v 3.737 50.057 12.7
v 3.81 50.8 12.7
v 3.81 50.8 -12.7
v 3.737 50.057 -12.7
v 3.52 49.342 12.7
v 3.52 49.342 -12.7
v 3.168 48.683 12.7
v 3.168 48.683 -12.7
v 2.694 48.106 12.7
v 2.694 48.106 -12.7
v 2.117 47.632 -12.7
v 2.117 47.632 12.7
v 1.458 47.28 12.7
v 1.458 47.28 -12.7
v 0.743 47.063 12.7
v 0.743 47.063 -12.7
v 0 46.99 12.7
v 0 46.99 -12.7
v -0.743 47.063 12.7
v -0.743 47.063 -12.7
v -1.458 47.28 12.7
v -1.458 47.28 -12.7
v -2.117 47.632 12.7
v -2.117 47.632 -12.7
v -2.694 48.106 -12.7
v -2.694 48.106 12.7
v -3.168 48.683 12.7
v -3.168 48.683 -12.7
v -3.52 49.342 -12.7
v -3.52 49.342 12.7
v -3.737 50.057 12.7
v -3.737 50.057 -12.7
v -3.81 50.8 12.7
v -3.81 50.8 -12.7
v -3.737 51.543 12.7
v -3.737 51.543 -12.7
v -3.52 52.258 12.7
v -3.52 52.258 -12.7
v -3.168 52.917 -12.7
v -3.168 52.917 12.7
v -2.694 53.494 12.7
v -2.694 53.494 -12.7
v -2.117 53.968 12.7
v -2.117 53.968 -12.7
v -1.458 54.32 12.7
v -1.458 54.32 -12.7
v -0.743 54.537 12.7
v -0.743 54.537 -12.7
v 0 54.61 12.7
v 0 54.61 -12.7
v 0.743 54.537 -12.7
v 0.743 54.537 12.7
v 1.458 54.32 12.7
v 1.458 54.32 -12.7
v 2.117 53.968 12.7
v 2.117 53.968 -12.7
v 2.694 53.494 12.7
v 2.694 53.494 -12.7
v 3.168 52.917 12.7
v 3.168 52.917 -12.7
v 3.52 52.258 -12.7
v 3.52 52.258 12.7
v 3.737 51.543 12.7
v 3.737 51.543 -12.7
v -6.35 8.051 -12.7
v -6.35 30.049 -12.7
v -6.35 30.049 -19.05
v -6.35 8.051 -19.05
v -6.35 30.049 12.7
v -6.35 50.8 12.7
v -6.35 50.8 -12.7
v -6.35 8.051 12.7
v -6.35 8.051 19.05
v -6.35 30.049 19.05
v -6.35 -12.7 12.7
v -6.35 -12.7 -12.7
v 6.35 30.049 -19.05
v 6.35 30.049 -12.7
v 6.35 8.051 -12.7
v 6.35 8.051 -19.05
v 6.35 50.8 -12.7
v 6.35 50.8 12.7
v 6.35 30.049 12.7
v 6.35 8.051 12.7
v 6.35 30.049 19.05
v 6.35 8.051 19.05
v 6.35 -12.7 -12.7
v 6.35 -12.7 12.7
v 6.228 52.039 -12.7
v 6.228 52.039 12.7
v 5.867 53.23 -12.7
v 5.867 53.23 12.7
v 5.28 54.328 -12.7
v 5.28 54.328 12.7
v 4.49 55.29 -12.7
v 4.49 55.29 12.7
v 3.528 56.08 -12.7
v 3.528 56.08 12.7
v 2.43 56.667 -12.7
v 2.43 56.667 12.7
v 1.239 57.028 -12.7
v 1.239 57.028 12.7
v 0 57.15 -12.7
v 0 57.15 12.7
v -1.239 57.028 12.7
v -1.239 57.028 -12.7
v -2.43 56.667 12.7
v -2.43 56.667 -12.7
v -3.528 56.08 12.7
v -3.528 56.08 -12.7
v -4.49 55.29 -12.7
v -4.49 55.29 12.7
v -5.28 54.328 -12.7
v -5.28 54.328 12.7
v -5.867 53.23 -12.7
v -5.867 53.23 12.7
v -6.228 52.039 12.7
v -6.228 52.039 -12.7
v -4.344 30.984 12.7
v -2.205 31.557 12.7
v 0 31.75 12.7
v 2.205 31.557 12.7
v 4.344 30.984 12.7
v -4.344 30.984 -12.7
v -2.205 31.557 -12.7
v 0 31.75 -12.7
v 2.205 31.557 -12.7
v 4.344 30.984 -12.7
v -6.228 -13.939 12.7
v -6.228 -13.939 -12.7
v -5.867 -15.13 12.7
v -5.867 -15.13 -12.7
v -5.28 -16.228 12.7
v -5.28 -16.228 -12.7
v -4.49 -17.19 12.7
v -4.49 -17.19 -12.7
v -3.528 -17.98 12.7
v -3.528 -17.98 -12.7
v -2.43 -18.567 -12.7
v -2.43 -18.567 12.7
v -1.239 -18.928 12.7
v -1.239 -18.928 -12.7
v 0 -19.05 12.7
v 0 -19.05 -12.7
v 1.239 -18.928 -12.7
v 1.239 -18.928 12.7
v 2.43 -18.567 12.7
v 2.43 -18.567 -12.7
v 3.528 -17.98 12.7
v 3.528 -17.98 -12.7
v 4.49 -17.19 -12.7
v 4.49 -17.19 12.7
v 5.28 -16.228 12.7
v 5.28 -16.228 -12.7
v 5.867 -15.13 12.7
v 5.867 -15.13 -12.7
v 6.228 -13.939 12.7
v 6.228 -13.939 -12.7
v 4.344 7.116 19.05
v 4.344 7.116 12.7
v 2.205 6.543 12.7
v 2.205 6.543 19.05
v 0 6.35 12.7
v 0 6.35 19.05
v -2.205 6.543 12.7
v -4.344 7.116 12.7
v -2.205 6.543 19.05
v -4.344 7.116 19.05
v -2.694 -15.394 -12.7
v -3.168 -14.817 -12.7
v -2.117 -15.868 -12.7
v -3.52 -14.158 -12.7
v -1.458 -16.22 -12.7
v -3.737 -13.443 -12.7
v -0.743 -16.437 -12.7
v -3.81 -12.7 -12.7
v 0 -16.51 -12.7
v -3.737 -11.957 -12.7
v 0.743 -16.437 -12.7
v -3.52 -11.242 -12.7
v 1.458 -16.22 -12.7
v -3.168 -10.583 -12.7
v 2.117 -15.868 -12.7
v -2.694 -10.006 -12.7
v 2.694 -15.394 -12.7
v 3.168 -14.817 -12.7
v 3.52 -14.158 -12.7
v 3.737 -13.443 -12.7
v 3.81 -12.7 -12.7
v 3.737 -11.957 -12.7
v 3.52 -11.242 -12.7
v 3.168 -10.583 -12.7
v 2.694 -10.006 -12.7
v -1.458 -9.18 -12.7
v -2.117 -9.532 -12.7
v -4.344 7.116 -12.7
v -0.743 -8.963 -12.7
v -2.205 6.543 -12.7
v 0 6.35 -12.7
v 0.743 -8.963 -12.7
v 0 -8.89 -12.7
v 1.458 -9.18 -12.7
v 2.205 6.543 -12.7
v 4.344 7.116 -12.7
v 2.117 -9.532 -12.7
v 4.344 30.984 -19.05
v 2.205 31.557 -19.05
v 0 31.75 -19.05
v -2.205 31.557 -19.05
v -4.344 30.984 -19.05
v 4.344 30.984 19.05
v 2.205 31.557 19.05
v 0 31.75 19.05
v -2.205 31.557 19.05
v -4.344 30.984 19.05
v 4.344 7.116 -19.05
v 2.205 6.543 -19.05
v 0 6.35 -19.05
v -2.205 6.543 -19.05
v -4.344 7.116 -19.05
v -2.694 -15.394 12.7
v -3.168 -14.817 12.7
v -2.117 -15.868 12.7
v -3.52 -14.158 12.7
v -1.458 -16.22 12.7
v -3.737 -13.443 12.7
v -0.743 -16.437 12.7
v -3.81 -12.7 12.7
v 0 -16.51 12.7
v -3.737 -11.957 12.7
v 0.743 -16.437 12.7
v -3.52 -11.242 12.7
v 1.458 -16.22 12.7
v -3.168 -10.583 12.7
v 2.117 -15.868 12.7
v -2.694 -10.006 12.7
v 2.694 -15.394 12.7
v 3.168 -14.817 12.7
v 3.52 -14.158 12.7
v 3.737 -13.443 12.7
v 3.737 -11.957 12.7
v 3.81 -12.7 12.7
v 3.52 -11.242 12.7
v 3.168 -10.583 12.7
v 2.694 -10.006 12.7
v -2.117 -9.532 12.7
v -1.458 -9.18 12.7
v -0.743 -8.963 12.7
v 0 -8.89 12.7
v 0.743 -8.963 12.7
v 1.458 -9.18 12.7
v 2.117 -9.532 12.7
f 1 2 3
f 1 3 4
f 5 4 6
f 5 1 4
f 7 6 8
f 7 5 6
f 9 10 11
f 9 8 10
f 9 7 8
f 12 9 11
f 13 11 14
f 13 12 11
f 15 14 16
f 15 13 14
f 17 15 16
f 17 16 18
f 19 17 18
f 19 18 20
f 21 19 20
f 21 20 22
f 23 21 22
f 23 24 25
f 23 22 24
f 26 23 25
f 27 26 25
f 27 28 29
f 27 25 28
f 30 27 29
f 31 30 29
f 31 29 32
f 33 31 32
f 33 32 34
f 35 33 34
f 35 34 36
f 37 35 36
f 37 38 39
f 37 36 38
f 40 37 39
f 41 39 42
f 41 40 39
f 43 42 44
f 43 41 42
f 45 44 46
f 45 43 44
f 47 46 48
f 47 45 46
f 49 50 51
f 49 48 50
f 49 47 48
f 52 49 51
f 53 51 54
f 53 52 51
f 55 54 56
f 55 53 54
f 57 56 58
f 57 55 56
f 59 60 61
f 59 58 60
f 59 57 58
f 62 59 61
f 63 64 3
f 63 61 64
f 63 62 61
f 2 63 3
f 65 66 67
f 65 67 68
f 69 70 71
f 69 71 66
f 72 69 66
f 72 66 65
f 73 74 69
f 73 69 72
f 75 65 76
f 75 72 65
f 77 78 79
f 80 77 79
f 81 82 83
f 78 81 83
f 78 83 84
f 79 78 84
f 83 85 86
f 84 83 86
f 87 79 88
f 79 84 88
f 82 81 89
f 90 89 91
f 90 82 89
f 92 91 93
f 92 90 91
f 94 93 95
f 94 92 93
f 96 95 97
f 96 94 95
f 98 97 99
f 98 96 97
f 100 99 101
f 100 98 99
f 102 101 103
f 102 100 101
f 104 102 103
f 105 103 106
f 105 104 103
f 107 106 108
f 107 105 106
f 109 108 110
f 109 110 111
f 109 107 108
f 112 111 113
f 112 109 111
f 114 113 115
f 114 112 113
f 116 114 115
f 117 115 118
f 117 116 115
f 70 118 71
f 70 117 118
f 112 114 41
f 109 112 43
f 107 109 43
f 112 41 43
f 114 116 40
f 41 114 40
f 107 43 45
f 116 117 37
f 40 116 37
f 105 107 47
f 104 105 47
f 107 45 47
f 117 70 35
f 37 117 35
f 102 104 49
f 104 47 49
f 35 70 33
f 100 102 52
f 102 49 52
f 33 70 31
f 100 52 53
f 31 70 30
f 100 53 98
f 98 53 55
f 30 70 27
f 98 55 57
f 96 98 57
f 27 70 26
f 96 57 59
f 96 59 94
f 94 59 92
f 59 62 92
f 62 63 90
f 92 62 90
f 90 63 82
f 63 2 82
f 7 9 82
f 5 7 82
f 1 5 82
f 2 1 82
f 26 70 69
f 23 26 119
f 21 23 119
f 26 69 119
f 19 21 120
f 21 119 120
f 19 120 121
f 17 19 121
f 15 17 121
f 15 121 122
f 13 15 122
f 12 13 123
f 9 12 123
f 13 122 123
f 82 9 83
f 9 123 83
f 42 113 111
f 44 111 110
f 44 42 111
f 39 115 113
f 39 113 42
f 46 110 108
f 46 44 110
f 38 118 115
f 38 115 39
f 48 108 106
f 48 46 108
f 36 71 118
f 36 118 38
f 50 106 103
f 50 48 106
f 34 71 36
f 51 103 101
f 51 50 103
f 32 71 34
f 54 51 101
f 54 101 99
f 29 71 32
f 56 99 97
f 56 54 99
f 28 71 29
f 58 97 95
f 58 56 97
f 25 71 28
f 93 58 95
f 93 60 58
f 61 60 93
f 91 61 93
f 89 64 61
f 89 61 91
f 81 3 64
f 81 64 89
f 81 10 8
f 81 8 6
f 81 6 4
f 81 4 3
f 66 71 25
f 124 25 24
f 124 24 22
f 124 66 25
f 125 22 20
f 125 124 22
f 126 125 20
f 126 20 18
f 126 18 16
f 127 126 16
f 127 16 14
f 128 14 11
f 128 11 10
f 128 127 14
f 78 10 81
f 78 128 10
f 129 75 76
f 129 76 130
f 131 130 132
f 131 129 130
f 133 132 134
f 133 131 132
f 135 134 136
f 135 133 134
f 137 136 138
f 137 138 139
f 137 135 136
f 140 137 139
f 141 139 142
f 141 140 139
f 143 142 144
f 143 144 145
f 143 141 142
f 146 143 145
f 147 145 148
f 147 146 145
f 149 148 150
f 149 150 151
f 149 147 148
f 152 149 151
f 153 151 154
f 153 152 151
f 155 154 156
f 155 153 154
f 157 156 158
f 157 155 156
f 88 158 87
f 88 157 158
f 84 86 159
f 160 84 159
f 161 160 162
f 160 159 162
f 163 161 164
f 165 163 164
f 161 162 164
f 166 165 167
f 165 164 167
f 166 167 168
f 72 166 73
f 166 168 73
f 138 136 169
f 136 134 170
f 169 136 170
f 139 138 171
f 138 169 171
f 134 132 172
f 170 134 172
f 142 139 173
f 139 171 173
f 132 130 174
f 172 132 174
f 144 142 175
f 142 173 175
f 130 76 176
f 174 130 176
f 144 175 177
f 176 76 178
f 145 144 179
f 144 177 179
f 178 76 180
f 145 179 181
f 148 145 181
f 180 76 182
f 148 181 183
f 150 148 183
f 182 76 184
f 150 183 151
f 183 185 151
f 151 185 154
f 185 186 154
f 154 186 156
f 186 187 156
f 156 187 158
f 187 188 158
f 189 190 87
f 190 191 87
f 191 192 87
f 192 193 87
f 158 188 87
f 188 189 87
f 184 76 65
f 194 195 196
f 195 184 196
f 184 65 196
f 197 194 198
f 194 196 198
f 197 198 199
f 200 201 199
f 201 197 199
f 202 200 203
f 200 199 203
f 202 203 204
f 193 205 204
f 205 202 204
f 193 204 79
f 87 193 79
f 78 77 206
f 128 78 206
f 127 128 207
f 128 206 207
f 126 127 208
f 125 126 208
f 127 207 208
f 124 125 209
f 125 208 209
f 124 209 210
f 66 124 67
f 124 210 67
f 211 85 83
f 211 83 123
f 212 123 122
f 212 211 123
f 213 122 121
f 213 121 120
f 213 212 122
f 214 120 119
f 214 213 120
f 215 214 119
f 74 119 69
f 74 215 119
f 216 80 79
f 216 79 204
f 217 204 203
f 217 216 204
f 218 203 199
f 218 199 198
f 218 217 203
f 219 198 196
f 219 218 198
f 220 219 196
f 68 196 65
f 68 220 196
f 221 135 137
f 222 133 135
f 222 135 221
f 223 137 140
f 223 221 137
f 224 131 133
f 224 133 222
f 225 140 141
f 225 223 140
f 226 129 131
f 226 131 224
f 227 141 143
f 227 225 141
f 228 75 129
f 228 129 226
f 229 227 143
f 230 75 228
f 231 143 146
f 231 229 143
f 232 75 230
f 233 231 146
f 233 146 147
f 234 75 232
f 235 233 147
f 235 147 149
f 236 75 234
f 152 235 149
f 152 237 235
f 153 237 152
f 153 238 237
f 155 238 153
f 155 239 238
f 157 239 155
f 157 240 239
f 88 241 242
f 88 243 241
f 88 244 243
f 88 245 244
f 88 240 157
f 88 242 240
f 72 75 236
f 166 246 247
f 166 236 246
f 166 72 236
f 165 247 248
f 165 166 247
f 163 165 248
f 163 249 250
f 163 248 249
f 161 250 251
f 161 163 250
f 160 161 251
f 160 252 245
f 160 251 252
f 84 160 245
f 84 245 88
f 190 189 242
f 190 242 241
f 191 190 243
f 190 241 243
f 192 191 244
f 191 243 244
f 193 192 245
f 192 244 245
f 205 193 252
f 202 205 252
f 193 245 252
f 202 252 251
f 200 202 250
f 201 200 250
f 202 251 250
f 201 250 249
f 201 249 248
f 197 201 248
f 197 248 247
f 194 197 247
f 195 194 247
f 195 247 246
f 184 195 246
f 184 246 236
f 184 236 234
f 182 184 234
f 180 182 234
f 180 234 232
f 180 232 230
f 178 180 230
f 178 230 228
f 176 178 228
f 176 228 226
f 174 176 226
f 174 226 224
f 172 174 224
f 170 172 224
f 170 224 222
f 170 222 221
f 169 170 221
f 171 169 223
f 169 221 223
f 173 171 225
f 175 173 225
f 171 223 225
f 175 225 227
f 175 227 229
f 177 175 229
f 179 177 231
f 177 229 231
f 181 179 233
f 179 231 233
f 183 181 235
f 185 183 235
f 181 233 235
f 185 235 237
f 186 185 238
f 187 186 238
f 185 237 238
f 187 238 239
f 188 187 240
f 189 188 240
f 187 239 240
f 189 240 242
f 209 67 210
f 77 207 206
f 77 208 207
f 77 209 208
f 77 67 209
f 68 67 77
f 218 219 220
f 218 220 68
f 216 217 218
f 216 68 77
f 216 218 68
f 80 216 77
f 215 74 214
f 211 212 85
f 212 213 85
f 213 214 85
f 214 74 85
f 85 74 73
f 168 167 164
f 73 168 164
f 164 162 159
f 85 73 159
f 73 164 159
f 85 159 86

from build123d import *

# Parameters (mm, degrees)
SKETCH1_W                   = 12.7
SKETCH1_H                   = 38.1
BOSS_EXTRUDE1_DEPTH         = 19.05
FILLET2_RADIUS              = 6.35
FILLET2_LENGTH              = 38.1
SKETCH2_R                   = 3.81
CUT_EXTRUDE1_DEPTH          = 38.1
CUT_EXTRUDE2_DEPTH          = 6.35
MIRROR7_COPY_1_DEPTH        = 6.35
FILLET2_OF_MIRROR7_2_RADIUS = 6.35
FILLET2_OF_MIRROR7_2_LENGTH = 38.1


with BuildPart() as part:
    # Sketch1 → Boss-Extrude1 (new, symmetric)
    with BuildSketch(Plane.XY):
        Rectangle(SKETCH1_W, SKETCH1_H)
    boss_extrude1 = extrude(amount=BOSS_EXTRUDE1_DEPTH, both=True)

    # Fillet2: full round fillet: the end face becomes a half cylinder, R = half its width
    fillet2_face = Plane((0, -19.05, 0), x_dir=(0, 0, 1), z_dir=(0, -1, 0))  # on the end face: x along it, z out of the body
    fillet2_slab = fillet2_face.offset(-FILLET2_RADIUS / 2) * Box(FILLET2_LENGTH, 2 * FILLET2_RADIUS, FILLET2_RADIUS, mode=Mode.PRIVATE)  # the body's end, R deep
    fillet2_round = Plane((0, -12.7, 0), x_dir=(0, -1, 0), z_dir=(0, 0, 1)) * Cylinder(FILLET2_RADIUS, FILLET2_LENGTH, mode=Mode.PRIVATE)  # its axis R under the face
    add(fillet2_slab - fillet2_round, mode=Mode.SUBTRACT)

    # Sketch2 → Cut-Extrude1 (cut)
    with BuildSketch(Plane.XY.offset(19.05)):
        with Locations((0, -12.7)):
            Circle(SKETCH2_R)
    cut_extrude1 = extrude(amount=-CUT_EXTRUDE1_DEPTH, mode=Mode.SUBTRACT)

    # Sketch8 → Cut-Extrude2 (cut)
    with BuildSketch(Plane.XY.offset(19.05)):
        with BuildLine():
            Line((-12.7, 19.05), (-12.7, -58.61254398))
            Line((-12.7, -58.61254398), (12.7, -58.61254398))
            Line((12.7, -58.61254398), (12.7, 19.05))
            ThreePointArc((12.7, 19.05), (0, 6.35), (-12.7, 19.05))
        make_face()
    cut_extrude2 = extrude(amount=-CUT_EXTRUDE2_DEPTH, mode=Mode.SUBTRACT)

    # Mirror5: Cut-Extrude2 across plane
    add(cut_extrude2.mirror(Plane.XY), mode=Mode.SUBTRACT)

    # Mirror7: Boss-Extrude1, Cut-Extrude1, Cut-Extrude2 across plane
    add(boss_extrude1.mirror(Plane(origin=(-6.35, 19.05, 19.05), x_dir=(0, 0, 1), z_dir=(0, -1, 0))))
    add(cut_extrude1.mirror(Plane(origin=(-6.35, 19.05, 19.05), x_dir=(0, 0, 1), z_dir=(0, -1, 0))), mode=Mode.SUBTRACT)
    add(cut_extrude2.mirror(Plane(origin=(-6.35, 19.05, 19.05), x_dir=(0, 0, 1), z_dir=(0, -1, 0))), mode=Mode.SUBTRACT)

    # Mirror7 copy 1 sketch → Mirror7 copy 1 (cut)
    with BuildSketch(Plane(origin=(0, 38.1, -19.05), x_dir=(1, 0, 0), z_dir=(0, 0, -1))):
        with BuildLine():
            Line((-12.7, 19.05), (-12.7, -58.61254398))
            Line((-12.7, -58.61254398), (12.7, -58.61254398))
            Line((12.7, -58.61254398), (12.7, 19.05))
            ThreePointArc((12.7, 19.05), (0, 6.35), (-12.7, 19.05))
        make_face()
    extrude(amount=-MIRROR7_COPY_1_DEPTH, mode=Mode.SUBTRACT)

    # Fillet2 of Mirror7 2: full round fillet: the end face becomes a half cylinder, R = half its width
    fillet2_of_mirror7_2_face = Plane((0, 57.15, 0), x_dir=(0, 0, 1), z_dir=(0, 1, 0))  # on the end face: x along it, z out of the body
    fillet2_of_mirror7_2_slab = fillet2_of_mirror7_2_face.offset(-FILLET2_OF_MIRROR7_2_RADIUS / 2) * Box(FILLET2_OF_MIRROR7_2_LENGTH, 2 * FILLET2_OF_MIRROR7_2_RADIUS, FILLET2_OF_MIRROR7_2_RADIUS, mode=Mode.PRIVATE)  # the body's end, R deep
    fillet2_of_mirror7_2_round = Plane((0, 50.8, 0), x_dir=(0, 1, 0), z_dir=(0, 0, 1)) * Cylinder(FILLET2_OF_MIRROR7_2_RADIUS, FILLET2_OF_MIRROR7_2_LENGTH, mode=Mode.PRIVATE)  # its axis R under the face
    add(fillet2_of_mirror7_2_slab - fillet2_of_mirror7_2_round, mode=Mode.SUBTRACT)


solid = part.part
